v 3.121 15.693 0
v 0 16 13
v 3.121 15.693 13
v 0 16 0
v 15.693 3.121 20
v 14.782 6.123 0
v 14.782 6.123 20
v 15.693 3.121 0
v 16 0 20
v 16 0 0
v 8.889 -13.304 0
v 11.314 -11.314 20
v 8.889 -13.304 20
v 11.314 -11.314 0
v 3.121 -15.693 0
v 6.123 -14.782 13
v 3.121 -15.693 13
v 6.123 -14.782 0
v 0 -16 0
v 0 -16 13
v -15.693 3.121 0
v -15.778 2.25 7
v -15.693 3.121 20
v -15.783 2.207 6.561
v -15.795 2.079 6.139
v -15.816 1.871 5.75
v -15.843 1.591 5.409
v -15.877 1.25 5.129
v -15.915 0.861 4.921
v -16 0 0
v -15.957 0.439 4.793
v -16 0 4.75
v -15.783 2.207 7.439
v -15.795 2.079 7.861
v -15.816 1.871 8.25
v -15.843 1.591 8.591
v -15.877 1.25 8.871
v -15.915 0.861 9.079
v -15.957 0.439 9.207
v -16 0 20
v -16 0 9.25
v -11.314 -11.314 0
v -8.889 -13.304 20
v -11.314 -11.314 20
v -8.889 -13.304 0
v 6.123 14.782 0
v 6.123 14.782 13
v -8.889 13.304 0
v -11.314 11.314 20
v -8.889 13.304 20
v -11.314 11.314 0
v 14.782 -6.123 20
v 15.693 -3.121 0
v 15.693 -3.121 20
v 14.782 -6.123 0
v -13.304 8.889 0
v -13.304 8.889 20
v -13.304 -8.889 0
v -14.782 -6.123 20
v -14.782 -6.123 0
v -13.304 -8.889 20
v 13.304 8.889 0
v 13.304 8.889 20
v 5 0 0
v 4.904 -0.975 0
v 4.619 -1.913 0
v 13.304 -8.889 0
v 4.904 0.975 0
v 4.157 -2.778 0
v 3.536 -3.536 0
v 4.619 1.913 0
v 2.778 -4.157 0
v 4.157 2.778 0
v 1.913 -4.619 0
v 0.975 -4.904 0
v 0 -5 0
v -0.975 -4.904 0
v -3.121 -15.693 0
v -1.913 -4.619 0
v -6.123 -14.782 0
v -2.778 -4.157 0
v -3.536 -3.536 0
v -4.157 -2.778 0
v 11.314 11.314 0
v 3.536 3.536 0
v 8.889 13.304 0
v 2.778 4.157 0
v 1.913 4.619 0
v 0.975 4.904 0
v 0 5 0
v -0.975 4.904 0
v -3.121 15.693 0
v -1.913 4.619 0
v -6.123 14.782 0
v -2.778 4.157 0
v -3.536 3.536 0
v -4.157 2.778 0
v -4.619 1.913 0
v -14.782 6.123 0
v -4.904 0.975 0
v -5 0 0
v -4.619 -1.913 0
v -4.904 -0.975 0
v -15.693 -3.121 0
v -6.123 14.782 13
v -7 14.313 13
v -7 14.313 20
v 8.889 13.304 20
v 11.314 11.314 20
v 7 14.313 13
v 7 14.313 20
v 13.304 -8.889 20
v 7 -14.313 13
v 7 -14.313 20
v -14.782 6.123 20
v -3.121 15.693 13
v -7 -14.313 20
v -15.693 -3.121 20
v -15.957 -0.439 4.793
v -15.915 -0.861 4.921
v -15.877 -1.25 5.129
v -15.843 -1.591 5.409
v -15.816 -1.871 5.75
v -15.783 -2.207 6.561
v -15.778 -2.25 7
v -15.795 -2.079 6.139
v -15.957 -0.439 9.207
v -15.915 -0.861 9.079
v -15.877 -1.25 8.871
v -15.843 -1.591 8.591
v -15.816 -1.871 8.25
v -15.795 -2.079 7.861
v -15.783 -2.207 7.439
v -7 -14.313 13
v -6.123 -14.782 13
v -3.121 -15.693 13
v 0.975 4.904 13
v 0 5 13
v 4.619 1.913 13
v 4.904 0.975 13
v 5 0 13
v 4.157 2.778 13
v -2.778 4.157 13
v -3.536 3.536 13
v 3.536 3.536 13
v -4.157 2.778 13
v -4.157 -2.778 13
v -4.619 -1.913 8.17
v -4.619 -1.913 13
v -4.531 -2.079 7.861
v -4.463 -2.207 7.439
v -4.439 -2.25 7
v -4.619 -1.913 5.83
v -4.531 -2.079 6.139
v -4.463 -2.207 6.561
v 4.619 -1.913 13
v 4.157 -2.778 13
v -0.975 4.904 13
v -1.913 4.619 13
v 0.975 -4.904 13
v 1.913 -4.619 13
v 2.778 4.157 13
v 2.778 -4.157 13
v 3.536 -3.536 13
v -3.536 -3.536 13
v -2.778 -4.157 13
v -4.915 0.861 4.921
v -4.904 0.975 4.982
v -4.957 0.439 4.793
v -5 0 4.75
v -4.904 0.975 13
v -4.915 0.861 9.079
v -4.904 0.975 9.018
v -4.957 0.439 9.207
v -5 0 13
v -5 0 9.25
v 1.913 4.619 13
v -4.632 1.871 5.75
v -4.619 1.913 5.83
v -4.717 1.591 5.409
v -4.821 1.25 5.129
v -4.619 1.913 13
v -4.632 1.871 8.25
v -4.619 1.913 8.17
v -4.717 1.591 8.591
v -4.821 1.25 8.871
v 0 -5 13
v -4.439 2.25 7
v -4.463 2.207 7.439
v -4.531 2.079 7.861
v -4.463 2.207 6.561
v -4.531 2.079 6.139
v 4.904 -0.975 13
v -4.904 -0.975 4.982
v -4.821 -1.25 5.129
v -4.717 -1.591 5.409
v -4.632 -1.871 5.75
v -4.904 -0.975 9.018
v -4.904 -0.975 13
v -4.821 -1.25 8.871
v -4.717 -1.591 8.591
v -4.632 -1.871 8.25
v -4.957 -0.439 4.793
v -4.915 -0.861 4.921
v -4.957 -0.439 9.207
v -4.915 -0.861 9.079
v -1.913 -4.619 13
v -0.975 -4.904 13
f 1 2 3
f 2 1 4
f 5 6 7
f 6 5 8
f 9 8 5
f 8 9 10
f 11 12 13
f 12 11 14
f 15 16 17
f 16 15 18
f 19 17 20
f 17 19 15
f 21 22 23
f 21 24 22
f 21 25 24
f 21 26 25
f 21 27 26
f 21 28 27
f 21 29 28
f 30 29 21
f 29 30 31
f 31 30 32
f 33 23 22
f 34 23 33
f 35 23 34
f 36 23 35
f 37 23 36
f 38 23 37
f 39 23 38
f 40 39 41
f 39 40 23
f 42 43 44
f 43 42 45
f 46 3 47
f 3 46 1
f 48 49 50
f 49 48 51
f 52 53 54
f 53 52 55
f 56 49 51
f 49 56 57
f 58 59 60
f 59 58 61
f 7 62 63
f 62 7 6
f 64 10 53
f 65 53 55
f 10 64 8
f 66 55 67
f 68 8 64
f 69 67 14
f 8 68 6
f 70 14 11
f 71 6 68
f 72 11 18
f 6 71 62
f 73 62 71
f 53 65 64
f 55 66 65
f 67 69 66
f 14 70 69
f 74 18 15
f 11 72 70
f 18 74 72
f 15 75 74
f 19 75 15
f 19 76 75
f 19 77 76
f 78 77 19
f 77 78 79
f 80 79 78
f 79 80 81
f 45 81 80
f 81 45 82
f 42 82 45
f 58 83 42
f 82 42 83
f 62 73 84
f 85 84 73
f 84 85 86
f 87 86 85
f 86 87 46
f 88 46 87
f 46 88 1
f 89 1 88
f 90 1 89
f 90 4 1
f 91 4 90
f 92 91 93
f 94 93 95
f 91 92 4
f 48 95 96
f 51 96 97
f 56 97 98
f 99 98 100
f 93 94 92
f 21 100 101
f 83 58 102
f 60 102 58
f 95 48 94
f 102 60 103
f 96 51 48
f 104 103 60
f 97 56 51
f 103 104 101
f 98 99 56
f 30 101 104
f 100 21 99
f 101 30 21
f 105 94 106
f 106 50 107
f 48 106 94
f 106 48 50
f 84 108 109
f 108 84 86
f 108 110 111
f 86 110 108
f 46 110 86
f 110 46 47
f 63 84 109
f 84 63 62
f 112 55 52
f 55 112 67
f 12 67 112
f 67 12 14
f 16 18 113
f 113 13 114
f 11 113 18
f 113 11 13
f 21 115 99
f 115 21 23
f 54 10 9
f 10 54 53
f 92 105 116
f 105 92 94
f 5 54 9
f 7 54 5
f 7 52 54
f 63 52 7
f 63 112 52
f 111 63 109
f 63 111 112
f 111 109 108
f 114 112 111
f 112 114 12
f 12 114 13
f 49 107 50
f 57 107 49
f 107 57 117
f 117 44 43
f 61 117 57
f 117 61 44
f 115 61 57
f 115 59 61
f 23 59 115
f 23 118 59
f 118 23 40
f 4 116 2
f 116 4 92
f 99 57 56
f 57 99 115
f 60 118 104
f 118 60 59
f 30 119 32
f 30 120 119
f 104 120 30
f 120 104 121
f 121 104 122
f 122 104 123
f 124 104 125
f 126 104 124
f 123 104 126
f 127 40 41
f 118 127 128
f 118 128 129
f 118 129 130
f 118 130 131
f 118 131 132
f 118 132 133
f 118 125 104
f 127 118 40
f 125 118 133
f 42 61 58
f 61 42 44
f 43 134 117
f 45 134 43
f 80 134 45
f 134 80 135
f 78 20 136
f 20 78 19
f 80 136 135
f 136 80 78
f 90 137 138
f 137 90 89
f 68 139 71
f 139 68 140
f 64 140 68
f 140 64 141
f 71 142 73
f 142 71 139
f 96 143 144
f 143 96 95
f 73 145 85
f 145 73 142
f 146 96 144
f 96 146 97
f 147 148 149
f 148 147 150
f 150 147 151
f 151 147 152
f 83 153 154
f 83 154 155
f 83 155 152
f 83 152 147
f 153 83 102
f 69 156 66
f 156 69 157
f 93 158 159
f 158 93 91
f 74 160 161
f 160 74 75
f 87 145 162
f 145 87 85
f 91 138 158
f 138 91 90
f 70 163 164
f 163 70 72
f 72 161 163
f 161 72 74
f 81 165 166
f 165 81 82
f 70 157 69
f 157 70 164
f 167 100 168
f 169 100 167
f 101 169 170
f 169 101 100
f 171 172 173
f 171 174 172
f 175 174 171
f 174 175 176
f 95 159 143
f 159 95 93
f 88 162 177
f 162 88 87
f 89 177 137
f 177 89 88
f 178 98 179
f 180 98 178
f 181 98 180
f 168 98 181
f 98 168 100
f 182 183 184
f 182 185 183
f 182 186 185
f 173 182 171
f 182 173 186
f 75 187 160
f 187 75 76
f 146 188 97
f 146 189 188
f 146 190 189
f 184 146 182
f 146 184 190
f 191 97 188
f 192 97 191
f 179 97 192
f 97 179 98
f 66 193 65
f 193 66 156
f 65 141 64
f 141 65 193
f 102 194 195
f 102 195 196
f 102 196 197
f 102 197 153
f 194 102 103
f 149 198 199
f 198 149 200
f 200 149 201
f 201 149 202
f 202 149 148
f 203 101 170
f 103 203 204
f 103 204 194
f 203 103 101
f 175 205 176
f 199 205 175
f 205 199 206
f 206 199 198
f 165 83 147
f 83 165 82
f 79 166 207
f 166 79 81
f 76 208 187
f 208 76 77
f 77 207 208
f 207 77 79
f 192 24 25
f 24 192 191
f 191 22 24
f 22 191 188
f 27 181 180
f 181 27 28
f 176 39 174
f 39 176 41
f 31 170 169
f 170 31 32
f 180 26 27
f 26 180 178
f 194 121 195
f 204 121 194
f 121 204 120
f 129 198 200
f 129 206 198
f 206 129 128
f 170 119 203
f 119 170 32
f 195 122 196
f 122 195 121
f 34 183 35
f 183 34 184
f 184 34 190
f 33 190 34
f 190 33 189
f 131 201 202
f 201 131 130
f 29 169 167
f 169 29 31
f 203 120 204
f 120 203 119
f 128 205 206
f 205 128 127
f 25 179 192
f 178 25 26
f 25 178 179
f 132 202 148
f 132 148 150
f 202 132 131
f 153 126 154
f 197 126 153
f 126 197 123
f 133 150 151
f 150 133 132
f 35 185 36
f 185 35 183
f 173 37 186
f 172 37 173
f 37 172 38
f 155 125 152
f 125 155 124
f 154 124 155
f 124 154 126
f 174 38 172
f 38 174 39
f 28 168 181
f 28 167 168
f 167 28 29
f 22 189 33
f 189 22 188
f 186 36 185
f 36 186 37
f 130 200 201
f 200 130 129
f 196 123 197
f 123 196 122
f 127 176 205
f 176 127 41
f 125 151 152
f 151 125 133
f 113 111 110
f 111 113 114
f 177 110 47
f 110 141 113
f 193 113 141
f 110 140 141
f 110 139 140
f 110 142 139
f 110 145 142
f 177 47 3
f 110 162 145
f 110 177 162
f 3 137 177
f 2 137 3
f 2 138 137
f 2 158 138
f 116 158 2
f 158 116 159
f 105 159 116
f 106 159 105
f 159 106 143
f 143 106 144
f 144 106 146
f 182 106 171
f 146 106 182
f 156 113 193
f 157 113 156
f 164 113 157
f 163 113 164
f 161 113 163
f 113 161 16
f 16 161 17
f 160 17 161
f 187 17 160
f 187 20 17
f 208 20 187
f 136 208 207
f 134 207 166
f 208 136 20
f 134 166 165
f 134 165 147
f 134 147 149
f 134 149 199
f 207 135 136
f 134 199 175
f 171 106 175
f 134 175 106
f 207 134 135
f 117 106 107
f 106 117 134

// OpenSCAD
$fn = 32;

// ----------------------------------------------------------------------
// Oldham coupling hub: 32 x 20 mm
// ----------------------------------------------------------------------

// --- parameters (mm) ---
hub_d = 32;               // hub diameter
hub_l = 14;               // hub length
bore_d = 10;              // shaft bore
tongue_w = 14;            // drive tongue width
tongue_h = 6;             // drive tongue height
set_d = 4.5;              // set screw tap hole

module hub() {
  /* the slot side is a raised disc with a groove milled across it */
  cylinder(h = hub_l + tongue_h, d = hub_d);
}

difference() {
  hub();
  translate([0, 0, -1]) cylinder(h = hub_l + tongue_h + 2, d = bore_d);
  translate([-hub_d / 2 - 1, 0, hub_l * 0.5])
    rotate([0, 90, 0]) cylinder(h = hub_d / 2 + 2, d = set_d);
  translate([-tongue_w / 2, -hub_d / 2 - 1, hub_l - 1])
    cube([tongue_w, hub_d + 2, tongue_h + 1]);
}
